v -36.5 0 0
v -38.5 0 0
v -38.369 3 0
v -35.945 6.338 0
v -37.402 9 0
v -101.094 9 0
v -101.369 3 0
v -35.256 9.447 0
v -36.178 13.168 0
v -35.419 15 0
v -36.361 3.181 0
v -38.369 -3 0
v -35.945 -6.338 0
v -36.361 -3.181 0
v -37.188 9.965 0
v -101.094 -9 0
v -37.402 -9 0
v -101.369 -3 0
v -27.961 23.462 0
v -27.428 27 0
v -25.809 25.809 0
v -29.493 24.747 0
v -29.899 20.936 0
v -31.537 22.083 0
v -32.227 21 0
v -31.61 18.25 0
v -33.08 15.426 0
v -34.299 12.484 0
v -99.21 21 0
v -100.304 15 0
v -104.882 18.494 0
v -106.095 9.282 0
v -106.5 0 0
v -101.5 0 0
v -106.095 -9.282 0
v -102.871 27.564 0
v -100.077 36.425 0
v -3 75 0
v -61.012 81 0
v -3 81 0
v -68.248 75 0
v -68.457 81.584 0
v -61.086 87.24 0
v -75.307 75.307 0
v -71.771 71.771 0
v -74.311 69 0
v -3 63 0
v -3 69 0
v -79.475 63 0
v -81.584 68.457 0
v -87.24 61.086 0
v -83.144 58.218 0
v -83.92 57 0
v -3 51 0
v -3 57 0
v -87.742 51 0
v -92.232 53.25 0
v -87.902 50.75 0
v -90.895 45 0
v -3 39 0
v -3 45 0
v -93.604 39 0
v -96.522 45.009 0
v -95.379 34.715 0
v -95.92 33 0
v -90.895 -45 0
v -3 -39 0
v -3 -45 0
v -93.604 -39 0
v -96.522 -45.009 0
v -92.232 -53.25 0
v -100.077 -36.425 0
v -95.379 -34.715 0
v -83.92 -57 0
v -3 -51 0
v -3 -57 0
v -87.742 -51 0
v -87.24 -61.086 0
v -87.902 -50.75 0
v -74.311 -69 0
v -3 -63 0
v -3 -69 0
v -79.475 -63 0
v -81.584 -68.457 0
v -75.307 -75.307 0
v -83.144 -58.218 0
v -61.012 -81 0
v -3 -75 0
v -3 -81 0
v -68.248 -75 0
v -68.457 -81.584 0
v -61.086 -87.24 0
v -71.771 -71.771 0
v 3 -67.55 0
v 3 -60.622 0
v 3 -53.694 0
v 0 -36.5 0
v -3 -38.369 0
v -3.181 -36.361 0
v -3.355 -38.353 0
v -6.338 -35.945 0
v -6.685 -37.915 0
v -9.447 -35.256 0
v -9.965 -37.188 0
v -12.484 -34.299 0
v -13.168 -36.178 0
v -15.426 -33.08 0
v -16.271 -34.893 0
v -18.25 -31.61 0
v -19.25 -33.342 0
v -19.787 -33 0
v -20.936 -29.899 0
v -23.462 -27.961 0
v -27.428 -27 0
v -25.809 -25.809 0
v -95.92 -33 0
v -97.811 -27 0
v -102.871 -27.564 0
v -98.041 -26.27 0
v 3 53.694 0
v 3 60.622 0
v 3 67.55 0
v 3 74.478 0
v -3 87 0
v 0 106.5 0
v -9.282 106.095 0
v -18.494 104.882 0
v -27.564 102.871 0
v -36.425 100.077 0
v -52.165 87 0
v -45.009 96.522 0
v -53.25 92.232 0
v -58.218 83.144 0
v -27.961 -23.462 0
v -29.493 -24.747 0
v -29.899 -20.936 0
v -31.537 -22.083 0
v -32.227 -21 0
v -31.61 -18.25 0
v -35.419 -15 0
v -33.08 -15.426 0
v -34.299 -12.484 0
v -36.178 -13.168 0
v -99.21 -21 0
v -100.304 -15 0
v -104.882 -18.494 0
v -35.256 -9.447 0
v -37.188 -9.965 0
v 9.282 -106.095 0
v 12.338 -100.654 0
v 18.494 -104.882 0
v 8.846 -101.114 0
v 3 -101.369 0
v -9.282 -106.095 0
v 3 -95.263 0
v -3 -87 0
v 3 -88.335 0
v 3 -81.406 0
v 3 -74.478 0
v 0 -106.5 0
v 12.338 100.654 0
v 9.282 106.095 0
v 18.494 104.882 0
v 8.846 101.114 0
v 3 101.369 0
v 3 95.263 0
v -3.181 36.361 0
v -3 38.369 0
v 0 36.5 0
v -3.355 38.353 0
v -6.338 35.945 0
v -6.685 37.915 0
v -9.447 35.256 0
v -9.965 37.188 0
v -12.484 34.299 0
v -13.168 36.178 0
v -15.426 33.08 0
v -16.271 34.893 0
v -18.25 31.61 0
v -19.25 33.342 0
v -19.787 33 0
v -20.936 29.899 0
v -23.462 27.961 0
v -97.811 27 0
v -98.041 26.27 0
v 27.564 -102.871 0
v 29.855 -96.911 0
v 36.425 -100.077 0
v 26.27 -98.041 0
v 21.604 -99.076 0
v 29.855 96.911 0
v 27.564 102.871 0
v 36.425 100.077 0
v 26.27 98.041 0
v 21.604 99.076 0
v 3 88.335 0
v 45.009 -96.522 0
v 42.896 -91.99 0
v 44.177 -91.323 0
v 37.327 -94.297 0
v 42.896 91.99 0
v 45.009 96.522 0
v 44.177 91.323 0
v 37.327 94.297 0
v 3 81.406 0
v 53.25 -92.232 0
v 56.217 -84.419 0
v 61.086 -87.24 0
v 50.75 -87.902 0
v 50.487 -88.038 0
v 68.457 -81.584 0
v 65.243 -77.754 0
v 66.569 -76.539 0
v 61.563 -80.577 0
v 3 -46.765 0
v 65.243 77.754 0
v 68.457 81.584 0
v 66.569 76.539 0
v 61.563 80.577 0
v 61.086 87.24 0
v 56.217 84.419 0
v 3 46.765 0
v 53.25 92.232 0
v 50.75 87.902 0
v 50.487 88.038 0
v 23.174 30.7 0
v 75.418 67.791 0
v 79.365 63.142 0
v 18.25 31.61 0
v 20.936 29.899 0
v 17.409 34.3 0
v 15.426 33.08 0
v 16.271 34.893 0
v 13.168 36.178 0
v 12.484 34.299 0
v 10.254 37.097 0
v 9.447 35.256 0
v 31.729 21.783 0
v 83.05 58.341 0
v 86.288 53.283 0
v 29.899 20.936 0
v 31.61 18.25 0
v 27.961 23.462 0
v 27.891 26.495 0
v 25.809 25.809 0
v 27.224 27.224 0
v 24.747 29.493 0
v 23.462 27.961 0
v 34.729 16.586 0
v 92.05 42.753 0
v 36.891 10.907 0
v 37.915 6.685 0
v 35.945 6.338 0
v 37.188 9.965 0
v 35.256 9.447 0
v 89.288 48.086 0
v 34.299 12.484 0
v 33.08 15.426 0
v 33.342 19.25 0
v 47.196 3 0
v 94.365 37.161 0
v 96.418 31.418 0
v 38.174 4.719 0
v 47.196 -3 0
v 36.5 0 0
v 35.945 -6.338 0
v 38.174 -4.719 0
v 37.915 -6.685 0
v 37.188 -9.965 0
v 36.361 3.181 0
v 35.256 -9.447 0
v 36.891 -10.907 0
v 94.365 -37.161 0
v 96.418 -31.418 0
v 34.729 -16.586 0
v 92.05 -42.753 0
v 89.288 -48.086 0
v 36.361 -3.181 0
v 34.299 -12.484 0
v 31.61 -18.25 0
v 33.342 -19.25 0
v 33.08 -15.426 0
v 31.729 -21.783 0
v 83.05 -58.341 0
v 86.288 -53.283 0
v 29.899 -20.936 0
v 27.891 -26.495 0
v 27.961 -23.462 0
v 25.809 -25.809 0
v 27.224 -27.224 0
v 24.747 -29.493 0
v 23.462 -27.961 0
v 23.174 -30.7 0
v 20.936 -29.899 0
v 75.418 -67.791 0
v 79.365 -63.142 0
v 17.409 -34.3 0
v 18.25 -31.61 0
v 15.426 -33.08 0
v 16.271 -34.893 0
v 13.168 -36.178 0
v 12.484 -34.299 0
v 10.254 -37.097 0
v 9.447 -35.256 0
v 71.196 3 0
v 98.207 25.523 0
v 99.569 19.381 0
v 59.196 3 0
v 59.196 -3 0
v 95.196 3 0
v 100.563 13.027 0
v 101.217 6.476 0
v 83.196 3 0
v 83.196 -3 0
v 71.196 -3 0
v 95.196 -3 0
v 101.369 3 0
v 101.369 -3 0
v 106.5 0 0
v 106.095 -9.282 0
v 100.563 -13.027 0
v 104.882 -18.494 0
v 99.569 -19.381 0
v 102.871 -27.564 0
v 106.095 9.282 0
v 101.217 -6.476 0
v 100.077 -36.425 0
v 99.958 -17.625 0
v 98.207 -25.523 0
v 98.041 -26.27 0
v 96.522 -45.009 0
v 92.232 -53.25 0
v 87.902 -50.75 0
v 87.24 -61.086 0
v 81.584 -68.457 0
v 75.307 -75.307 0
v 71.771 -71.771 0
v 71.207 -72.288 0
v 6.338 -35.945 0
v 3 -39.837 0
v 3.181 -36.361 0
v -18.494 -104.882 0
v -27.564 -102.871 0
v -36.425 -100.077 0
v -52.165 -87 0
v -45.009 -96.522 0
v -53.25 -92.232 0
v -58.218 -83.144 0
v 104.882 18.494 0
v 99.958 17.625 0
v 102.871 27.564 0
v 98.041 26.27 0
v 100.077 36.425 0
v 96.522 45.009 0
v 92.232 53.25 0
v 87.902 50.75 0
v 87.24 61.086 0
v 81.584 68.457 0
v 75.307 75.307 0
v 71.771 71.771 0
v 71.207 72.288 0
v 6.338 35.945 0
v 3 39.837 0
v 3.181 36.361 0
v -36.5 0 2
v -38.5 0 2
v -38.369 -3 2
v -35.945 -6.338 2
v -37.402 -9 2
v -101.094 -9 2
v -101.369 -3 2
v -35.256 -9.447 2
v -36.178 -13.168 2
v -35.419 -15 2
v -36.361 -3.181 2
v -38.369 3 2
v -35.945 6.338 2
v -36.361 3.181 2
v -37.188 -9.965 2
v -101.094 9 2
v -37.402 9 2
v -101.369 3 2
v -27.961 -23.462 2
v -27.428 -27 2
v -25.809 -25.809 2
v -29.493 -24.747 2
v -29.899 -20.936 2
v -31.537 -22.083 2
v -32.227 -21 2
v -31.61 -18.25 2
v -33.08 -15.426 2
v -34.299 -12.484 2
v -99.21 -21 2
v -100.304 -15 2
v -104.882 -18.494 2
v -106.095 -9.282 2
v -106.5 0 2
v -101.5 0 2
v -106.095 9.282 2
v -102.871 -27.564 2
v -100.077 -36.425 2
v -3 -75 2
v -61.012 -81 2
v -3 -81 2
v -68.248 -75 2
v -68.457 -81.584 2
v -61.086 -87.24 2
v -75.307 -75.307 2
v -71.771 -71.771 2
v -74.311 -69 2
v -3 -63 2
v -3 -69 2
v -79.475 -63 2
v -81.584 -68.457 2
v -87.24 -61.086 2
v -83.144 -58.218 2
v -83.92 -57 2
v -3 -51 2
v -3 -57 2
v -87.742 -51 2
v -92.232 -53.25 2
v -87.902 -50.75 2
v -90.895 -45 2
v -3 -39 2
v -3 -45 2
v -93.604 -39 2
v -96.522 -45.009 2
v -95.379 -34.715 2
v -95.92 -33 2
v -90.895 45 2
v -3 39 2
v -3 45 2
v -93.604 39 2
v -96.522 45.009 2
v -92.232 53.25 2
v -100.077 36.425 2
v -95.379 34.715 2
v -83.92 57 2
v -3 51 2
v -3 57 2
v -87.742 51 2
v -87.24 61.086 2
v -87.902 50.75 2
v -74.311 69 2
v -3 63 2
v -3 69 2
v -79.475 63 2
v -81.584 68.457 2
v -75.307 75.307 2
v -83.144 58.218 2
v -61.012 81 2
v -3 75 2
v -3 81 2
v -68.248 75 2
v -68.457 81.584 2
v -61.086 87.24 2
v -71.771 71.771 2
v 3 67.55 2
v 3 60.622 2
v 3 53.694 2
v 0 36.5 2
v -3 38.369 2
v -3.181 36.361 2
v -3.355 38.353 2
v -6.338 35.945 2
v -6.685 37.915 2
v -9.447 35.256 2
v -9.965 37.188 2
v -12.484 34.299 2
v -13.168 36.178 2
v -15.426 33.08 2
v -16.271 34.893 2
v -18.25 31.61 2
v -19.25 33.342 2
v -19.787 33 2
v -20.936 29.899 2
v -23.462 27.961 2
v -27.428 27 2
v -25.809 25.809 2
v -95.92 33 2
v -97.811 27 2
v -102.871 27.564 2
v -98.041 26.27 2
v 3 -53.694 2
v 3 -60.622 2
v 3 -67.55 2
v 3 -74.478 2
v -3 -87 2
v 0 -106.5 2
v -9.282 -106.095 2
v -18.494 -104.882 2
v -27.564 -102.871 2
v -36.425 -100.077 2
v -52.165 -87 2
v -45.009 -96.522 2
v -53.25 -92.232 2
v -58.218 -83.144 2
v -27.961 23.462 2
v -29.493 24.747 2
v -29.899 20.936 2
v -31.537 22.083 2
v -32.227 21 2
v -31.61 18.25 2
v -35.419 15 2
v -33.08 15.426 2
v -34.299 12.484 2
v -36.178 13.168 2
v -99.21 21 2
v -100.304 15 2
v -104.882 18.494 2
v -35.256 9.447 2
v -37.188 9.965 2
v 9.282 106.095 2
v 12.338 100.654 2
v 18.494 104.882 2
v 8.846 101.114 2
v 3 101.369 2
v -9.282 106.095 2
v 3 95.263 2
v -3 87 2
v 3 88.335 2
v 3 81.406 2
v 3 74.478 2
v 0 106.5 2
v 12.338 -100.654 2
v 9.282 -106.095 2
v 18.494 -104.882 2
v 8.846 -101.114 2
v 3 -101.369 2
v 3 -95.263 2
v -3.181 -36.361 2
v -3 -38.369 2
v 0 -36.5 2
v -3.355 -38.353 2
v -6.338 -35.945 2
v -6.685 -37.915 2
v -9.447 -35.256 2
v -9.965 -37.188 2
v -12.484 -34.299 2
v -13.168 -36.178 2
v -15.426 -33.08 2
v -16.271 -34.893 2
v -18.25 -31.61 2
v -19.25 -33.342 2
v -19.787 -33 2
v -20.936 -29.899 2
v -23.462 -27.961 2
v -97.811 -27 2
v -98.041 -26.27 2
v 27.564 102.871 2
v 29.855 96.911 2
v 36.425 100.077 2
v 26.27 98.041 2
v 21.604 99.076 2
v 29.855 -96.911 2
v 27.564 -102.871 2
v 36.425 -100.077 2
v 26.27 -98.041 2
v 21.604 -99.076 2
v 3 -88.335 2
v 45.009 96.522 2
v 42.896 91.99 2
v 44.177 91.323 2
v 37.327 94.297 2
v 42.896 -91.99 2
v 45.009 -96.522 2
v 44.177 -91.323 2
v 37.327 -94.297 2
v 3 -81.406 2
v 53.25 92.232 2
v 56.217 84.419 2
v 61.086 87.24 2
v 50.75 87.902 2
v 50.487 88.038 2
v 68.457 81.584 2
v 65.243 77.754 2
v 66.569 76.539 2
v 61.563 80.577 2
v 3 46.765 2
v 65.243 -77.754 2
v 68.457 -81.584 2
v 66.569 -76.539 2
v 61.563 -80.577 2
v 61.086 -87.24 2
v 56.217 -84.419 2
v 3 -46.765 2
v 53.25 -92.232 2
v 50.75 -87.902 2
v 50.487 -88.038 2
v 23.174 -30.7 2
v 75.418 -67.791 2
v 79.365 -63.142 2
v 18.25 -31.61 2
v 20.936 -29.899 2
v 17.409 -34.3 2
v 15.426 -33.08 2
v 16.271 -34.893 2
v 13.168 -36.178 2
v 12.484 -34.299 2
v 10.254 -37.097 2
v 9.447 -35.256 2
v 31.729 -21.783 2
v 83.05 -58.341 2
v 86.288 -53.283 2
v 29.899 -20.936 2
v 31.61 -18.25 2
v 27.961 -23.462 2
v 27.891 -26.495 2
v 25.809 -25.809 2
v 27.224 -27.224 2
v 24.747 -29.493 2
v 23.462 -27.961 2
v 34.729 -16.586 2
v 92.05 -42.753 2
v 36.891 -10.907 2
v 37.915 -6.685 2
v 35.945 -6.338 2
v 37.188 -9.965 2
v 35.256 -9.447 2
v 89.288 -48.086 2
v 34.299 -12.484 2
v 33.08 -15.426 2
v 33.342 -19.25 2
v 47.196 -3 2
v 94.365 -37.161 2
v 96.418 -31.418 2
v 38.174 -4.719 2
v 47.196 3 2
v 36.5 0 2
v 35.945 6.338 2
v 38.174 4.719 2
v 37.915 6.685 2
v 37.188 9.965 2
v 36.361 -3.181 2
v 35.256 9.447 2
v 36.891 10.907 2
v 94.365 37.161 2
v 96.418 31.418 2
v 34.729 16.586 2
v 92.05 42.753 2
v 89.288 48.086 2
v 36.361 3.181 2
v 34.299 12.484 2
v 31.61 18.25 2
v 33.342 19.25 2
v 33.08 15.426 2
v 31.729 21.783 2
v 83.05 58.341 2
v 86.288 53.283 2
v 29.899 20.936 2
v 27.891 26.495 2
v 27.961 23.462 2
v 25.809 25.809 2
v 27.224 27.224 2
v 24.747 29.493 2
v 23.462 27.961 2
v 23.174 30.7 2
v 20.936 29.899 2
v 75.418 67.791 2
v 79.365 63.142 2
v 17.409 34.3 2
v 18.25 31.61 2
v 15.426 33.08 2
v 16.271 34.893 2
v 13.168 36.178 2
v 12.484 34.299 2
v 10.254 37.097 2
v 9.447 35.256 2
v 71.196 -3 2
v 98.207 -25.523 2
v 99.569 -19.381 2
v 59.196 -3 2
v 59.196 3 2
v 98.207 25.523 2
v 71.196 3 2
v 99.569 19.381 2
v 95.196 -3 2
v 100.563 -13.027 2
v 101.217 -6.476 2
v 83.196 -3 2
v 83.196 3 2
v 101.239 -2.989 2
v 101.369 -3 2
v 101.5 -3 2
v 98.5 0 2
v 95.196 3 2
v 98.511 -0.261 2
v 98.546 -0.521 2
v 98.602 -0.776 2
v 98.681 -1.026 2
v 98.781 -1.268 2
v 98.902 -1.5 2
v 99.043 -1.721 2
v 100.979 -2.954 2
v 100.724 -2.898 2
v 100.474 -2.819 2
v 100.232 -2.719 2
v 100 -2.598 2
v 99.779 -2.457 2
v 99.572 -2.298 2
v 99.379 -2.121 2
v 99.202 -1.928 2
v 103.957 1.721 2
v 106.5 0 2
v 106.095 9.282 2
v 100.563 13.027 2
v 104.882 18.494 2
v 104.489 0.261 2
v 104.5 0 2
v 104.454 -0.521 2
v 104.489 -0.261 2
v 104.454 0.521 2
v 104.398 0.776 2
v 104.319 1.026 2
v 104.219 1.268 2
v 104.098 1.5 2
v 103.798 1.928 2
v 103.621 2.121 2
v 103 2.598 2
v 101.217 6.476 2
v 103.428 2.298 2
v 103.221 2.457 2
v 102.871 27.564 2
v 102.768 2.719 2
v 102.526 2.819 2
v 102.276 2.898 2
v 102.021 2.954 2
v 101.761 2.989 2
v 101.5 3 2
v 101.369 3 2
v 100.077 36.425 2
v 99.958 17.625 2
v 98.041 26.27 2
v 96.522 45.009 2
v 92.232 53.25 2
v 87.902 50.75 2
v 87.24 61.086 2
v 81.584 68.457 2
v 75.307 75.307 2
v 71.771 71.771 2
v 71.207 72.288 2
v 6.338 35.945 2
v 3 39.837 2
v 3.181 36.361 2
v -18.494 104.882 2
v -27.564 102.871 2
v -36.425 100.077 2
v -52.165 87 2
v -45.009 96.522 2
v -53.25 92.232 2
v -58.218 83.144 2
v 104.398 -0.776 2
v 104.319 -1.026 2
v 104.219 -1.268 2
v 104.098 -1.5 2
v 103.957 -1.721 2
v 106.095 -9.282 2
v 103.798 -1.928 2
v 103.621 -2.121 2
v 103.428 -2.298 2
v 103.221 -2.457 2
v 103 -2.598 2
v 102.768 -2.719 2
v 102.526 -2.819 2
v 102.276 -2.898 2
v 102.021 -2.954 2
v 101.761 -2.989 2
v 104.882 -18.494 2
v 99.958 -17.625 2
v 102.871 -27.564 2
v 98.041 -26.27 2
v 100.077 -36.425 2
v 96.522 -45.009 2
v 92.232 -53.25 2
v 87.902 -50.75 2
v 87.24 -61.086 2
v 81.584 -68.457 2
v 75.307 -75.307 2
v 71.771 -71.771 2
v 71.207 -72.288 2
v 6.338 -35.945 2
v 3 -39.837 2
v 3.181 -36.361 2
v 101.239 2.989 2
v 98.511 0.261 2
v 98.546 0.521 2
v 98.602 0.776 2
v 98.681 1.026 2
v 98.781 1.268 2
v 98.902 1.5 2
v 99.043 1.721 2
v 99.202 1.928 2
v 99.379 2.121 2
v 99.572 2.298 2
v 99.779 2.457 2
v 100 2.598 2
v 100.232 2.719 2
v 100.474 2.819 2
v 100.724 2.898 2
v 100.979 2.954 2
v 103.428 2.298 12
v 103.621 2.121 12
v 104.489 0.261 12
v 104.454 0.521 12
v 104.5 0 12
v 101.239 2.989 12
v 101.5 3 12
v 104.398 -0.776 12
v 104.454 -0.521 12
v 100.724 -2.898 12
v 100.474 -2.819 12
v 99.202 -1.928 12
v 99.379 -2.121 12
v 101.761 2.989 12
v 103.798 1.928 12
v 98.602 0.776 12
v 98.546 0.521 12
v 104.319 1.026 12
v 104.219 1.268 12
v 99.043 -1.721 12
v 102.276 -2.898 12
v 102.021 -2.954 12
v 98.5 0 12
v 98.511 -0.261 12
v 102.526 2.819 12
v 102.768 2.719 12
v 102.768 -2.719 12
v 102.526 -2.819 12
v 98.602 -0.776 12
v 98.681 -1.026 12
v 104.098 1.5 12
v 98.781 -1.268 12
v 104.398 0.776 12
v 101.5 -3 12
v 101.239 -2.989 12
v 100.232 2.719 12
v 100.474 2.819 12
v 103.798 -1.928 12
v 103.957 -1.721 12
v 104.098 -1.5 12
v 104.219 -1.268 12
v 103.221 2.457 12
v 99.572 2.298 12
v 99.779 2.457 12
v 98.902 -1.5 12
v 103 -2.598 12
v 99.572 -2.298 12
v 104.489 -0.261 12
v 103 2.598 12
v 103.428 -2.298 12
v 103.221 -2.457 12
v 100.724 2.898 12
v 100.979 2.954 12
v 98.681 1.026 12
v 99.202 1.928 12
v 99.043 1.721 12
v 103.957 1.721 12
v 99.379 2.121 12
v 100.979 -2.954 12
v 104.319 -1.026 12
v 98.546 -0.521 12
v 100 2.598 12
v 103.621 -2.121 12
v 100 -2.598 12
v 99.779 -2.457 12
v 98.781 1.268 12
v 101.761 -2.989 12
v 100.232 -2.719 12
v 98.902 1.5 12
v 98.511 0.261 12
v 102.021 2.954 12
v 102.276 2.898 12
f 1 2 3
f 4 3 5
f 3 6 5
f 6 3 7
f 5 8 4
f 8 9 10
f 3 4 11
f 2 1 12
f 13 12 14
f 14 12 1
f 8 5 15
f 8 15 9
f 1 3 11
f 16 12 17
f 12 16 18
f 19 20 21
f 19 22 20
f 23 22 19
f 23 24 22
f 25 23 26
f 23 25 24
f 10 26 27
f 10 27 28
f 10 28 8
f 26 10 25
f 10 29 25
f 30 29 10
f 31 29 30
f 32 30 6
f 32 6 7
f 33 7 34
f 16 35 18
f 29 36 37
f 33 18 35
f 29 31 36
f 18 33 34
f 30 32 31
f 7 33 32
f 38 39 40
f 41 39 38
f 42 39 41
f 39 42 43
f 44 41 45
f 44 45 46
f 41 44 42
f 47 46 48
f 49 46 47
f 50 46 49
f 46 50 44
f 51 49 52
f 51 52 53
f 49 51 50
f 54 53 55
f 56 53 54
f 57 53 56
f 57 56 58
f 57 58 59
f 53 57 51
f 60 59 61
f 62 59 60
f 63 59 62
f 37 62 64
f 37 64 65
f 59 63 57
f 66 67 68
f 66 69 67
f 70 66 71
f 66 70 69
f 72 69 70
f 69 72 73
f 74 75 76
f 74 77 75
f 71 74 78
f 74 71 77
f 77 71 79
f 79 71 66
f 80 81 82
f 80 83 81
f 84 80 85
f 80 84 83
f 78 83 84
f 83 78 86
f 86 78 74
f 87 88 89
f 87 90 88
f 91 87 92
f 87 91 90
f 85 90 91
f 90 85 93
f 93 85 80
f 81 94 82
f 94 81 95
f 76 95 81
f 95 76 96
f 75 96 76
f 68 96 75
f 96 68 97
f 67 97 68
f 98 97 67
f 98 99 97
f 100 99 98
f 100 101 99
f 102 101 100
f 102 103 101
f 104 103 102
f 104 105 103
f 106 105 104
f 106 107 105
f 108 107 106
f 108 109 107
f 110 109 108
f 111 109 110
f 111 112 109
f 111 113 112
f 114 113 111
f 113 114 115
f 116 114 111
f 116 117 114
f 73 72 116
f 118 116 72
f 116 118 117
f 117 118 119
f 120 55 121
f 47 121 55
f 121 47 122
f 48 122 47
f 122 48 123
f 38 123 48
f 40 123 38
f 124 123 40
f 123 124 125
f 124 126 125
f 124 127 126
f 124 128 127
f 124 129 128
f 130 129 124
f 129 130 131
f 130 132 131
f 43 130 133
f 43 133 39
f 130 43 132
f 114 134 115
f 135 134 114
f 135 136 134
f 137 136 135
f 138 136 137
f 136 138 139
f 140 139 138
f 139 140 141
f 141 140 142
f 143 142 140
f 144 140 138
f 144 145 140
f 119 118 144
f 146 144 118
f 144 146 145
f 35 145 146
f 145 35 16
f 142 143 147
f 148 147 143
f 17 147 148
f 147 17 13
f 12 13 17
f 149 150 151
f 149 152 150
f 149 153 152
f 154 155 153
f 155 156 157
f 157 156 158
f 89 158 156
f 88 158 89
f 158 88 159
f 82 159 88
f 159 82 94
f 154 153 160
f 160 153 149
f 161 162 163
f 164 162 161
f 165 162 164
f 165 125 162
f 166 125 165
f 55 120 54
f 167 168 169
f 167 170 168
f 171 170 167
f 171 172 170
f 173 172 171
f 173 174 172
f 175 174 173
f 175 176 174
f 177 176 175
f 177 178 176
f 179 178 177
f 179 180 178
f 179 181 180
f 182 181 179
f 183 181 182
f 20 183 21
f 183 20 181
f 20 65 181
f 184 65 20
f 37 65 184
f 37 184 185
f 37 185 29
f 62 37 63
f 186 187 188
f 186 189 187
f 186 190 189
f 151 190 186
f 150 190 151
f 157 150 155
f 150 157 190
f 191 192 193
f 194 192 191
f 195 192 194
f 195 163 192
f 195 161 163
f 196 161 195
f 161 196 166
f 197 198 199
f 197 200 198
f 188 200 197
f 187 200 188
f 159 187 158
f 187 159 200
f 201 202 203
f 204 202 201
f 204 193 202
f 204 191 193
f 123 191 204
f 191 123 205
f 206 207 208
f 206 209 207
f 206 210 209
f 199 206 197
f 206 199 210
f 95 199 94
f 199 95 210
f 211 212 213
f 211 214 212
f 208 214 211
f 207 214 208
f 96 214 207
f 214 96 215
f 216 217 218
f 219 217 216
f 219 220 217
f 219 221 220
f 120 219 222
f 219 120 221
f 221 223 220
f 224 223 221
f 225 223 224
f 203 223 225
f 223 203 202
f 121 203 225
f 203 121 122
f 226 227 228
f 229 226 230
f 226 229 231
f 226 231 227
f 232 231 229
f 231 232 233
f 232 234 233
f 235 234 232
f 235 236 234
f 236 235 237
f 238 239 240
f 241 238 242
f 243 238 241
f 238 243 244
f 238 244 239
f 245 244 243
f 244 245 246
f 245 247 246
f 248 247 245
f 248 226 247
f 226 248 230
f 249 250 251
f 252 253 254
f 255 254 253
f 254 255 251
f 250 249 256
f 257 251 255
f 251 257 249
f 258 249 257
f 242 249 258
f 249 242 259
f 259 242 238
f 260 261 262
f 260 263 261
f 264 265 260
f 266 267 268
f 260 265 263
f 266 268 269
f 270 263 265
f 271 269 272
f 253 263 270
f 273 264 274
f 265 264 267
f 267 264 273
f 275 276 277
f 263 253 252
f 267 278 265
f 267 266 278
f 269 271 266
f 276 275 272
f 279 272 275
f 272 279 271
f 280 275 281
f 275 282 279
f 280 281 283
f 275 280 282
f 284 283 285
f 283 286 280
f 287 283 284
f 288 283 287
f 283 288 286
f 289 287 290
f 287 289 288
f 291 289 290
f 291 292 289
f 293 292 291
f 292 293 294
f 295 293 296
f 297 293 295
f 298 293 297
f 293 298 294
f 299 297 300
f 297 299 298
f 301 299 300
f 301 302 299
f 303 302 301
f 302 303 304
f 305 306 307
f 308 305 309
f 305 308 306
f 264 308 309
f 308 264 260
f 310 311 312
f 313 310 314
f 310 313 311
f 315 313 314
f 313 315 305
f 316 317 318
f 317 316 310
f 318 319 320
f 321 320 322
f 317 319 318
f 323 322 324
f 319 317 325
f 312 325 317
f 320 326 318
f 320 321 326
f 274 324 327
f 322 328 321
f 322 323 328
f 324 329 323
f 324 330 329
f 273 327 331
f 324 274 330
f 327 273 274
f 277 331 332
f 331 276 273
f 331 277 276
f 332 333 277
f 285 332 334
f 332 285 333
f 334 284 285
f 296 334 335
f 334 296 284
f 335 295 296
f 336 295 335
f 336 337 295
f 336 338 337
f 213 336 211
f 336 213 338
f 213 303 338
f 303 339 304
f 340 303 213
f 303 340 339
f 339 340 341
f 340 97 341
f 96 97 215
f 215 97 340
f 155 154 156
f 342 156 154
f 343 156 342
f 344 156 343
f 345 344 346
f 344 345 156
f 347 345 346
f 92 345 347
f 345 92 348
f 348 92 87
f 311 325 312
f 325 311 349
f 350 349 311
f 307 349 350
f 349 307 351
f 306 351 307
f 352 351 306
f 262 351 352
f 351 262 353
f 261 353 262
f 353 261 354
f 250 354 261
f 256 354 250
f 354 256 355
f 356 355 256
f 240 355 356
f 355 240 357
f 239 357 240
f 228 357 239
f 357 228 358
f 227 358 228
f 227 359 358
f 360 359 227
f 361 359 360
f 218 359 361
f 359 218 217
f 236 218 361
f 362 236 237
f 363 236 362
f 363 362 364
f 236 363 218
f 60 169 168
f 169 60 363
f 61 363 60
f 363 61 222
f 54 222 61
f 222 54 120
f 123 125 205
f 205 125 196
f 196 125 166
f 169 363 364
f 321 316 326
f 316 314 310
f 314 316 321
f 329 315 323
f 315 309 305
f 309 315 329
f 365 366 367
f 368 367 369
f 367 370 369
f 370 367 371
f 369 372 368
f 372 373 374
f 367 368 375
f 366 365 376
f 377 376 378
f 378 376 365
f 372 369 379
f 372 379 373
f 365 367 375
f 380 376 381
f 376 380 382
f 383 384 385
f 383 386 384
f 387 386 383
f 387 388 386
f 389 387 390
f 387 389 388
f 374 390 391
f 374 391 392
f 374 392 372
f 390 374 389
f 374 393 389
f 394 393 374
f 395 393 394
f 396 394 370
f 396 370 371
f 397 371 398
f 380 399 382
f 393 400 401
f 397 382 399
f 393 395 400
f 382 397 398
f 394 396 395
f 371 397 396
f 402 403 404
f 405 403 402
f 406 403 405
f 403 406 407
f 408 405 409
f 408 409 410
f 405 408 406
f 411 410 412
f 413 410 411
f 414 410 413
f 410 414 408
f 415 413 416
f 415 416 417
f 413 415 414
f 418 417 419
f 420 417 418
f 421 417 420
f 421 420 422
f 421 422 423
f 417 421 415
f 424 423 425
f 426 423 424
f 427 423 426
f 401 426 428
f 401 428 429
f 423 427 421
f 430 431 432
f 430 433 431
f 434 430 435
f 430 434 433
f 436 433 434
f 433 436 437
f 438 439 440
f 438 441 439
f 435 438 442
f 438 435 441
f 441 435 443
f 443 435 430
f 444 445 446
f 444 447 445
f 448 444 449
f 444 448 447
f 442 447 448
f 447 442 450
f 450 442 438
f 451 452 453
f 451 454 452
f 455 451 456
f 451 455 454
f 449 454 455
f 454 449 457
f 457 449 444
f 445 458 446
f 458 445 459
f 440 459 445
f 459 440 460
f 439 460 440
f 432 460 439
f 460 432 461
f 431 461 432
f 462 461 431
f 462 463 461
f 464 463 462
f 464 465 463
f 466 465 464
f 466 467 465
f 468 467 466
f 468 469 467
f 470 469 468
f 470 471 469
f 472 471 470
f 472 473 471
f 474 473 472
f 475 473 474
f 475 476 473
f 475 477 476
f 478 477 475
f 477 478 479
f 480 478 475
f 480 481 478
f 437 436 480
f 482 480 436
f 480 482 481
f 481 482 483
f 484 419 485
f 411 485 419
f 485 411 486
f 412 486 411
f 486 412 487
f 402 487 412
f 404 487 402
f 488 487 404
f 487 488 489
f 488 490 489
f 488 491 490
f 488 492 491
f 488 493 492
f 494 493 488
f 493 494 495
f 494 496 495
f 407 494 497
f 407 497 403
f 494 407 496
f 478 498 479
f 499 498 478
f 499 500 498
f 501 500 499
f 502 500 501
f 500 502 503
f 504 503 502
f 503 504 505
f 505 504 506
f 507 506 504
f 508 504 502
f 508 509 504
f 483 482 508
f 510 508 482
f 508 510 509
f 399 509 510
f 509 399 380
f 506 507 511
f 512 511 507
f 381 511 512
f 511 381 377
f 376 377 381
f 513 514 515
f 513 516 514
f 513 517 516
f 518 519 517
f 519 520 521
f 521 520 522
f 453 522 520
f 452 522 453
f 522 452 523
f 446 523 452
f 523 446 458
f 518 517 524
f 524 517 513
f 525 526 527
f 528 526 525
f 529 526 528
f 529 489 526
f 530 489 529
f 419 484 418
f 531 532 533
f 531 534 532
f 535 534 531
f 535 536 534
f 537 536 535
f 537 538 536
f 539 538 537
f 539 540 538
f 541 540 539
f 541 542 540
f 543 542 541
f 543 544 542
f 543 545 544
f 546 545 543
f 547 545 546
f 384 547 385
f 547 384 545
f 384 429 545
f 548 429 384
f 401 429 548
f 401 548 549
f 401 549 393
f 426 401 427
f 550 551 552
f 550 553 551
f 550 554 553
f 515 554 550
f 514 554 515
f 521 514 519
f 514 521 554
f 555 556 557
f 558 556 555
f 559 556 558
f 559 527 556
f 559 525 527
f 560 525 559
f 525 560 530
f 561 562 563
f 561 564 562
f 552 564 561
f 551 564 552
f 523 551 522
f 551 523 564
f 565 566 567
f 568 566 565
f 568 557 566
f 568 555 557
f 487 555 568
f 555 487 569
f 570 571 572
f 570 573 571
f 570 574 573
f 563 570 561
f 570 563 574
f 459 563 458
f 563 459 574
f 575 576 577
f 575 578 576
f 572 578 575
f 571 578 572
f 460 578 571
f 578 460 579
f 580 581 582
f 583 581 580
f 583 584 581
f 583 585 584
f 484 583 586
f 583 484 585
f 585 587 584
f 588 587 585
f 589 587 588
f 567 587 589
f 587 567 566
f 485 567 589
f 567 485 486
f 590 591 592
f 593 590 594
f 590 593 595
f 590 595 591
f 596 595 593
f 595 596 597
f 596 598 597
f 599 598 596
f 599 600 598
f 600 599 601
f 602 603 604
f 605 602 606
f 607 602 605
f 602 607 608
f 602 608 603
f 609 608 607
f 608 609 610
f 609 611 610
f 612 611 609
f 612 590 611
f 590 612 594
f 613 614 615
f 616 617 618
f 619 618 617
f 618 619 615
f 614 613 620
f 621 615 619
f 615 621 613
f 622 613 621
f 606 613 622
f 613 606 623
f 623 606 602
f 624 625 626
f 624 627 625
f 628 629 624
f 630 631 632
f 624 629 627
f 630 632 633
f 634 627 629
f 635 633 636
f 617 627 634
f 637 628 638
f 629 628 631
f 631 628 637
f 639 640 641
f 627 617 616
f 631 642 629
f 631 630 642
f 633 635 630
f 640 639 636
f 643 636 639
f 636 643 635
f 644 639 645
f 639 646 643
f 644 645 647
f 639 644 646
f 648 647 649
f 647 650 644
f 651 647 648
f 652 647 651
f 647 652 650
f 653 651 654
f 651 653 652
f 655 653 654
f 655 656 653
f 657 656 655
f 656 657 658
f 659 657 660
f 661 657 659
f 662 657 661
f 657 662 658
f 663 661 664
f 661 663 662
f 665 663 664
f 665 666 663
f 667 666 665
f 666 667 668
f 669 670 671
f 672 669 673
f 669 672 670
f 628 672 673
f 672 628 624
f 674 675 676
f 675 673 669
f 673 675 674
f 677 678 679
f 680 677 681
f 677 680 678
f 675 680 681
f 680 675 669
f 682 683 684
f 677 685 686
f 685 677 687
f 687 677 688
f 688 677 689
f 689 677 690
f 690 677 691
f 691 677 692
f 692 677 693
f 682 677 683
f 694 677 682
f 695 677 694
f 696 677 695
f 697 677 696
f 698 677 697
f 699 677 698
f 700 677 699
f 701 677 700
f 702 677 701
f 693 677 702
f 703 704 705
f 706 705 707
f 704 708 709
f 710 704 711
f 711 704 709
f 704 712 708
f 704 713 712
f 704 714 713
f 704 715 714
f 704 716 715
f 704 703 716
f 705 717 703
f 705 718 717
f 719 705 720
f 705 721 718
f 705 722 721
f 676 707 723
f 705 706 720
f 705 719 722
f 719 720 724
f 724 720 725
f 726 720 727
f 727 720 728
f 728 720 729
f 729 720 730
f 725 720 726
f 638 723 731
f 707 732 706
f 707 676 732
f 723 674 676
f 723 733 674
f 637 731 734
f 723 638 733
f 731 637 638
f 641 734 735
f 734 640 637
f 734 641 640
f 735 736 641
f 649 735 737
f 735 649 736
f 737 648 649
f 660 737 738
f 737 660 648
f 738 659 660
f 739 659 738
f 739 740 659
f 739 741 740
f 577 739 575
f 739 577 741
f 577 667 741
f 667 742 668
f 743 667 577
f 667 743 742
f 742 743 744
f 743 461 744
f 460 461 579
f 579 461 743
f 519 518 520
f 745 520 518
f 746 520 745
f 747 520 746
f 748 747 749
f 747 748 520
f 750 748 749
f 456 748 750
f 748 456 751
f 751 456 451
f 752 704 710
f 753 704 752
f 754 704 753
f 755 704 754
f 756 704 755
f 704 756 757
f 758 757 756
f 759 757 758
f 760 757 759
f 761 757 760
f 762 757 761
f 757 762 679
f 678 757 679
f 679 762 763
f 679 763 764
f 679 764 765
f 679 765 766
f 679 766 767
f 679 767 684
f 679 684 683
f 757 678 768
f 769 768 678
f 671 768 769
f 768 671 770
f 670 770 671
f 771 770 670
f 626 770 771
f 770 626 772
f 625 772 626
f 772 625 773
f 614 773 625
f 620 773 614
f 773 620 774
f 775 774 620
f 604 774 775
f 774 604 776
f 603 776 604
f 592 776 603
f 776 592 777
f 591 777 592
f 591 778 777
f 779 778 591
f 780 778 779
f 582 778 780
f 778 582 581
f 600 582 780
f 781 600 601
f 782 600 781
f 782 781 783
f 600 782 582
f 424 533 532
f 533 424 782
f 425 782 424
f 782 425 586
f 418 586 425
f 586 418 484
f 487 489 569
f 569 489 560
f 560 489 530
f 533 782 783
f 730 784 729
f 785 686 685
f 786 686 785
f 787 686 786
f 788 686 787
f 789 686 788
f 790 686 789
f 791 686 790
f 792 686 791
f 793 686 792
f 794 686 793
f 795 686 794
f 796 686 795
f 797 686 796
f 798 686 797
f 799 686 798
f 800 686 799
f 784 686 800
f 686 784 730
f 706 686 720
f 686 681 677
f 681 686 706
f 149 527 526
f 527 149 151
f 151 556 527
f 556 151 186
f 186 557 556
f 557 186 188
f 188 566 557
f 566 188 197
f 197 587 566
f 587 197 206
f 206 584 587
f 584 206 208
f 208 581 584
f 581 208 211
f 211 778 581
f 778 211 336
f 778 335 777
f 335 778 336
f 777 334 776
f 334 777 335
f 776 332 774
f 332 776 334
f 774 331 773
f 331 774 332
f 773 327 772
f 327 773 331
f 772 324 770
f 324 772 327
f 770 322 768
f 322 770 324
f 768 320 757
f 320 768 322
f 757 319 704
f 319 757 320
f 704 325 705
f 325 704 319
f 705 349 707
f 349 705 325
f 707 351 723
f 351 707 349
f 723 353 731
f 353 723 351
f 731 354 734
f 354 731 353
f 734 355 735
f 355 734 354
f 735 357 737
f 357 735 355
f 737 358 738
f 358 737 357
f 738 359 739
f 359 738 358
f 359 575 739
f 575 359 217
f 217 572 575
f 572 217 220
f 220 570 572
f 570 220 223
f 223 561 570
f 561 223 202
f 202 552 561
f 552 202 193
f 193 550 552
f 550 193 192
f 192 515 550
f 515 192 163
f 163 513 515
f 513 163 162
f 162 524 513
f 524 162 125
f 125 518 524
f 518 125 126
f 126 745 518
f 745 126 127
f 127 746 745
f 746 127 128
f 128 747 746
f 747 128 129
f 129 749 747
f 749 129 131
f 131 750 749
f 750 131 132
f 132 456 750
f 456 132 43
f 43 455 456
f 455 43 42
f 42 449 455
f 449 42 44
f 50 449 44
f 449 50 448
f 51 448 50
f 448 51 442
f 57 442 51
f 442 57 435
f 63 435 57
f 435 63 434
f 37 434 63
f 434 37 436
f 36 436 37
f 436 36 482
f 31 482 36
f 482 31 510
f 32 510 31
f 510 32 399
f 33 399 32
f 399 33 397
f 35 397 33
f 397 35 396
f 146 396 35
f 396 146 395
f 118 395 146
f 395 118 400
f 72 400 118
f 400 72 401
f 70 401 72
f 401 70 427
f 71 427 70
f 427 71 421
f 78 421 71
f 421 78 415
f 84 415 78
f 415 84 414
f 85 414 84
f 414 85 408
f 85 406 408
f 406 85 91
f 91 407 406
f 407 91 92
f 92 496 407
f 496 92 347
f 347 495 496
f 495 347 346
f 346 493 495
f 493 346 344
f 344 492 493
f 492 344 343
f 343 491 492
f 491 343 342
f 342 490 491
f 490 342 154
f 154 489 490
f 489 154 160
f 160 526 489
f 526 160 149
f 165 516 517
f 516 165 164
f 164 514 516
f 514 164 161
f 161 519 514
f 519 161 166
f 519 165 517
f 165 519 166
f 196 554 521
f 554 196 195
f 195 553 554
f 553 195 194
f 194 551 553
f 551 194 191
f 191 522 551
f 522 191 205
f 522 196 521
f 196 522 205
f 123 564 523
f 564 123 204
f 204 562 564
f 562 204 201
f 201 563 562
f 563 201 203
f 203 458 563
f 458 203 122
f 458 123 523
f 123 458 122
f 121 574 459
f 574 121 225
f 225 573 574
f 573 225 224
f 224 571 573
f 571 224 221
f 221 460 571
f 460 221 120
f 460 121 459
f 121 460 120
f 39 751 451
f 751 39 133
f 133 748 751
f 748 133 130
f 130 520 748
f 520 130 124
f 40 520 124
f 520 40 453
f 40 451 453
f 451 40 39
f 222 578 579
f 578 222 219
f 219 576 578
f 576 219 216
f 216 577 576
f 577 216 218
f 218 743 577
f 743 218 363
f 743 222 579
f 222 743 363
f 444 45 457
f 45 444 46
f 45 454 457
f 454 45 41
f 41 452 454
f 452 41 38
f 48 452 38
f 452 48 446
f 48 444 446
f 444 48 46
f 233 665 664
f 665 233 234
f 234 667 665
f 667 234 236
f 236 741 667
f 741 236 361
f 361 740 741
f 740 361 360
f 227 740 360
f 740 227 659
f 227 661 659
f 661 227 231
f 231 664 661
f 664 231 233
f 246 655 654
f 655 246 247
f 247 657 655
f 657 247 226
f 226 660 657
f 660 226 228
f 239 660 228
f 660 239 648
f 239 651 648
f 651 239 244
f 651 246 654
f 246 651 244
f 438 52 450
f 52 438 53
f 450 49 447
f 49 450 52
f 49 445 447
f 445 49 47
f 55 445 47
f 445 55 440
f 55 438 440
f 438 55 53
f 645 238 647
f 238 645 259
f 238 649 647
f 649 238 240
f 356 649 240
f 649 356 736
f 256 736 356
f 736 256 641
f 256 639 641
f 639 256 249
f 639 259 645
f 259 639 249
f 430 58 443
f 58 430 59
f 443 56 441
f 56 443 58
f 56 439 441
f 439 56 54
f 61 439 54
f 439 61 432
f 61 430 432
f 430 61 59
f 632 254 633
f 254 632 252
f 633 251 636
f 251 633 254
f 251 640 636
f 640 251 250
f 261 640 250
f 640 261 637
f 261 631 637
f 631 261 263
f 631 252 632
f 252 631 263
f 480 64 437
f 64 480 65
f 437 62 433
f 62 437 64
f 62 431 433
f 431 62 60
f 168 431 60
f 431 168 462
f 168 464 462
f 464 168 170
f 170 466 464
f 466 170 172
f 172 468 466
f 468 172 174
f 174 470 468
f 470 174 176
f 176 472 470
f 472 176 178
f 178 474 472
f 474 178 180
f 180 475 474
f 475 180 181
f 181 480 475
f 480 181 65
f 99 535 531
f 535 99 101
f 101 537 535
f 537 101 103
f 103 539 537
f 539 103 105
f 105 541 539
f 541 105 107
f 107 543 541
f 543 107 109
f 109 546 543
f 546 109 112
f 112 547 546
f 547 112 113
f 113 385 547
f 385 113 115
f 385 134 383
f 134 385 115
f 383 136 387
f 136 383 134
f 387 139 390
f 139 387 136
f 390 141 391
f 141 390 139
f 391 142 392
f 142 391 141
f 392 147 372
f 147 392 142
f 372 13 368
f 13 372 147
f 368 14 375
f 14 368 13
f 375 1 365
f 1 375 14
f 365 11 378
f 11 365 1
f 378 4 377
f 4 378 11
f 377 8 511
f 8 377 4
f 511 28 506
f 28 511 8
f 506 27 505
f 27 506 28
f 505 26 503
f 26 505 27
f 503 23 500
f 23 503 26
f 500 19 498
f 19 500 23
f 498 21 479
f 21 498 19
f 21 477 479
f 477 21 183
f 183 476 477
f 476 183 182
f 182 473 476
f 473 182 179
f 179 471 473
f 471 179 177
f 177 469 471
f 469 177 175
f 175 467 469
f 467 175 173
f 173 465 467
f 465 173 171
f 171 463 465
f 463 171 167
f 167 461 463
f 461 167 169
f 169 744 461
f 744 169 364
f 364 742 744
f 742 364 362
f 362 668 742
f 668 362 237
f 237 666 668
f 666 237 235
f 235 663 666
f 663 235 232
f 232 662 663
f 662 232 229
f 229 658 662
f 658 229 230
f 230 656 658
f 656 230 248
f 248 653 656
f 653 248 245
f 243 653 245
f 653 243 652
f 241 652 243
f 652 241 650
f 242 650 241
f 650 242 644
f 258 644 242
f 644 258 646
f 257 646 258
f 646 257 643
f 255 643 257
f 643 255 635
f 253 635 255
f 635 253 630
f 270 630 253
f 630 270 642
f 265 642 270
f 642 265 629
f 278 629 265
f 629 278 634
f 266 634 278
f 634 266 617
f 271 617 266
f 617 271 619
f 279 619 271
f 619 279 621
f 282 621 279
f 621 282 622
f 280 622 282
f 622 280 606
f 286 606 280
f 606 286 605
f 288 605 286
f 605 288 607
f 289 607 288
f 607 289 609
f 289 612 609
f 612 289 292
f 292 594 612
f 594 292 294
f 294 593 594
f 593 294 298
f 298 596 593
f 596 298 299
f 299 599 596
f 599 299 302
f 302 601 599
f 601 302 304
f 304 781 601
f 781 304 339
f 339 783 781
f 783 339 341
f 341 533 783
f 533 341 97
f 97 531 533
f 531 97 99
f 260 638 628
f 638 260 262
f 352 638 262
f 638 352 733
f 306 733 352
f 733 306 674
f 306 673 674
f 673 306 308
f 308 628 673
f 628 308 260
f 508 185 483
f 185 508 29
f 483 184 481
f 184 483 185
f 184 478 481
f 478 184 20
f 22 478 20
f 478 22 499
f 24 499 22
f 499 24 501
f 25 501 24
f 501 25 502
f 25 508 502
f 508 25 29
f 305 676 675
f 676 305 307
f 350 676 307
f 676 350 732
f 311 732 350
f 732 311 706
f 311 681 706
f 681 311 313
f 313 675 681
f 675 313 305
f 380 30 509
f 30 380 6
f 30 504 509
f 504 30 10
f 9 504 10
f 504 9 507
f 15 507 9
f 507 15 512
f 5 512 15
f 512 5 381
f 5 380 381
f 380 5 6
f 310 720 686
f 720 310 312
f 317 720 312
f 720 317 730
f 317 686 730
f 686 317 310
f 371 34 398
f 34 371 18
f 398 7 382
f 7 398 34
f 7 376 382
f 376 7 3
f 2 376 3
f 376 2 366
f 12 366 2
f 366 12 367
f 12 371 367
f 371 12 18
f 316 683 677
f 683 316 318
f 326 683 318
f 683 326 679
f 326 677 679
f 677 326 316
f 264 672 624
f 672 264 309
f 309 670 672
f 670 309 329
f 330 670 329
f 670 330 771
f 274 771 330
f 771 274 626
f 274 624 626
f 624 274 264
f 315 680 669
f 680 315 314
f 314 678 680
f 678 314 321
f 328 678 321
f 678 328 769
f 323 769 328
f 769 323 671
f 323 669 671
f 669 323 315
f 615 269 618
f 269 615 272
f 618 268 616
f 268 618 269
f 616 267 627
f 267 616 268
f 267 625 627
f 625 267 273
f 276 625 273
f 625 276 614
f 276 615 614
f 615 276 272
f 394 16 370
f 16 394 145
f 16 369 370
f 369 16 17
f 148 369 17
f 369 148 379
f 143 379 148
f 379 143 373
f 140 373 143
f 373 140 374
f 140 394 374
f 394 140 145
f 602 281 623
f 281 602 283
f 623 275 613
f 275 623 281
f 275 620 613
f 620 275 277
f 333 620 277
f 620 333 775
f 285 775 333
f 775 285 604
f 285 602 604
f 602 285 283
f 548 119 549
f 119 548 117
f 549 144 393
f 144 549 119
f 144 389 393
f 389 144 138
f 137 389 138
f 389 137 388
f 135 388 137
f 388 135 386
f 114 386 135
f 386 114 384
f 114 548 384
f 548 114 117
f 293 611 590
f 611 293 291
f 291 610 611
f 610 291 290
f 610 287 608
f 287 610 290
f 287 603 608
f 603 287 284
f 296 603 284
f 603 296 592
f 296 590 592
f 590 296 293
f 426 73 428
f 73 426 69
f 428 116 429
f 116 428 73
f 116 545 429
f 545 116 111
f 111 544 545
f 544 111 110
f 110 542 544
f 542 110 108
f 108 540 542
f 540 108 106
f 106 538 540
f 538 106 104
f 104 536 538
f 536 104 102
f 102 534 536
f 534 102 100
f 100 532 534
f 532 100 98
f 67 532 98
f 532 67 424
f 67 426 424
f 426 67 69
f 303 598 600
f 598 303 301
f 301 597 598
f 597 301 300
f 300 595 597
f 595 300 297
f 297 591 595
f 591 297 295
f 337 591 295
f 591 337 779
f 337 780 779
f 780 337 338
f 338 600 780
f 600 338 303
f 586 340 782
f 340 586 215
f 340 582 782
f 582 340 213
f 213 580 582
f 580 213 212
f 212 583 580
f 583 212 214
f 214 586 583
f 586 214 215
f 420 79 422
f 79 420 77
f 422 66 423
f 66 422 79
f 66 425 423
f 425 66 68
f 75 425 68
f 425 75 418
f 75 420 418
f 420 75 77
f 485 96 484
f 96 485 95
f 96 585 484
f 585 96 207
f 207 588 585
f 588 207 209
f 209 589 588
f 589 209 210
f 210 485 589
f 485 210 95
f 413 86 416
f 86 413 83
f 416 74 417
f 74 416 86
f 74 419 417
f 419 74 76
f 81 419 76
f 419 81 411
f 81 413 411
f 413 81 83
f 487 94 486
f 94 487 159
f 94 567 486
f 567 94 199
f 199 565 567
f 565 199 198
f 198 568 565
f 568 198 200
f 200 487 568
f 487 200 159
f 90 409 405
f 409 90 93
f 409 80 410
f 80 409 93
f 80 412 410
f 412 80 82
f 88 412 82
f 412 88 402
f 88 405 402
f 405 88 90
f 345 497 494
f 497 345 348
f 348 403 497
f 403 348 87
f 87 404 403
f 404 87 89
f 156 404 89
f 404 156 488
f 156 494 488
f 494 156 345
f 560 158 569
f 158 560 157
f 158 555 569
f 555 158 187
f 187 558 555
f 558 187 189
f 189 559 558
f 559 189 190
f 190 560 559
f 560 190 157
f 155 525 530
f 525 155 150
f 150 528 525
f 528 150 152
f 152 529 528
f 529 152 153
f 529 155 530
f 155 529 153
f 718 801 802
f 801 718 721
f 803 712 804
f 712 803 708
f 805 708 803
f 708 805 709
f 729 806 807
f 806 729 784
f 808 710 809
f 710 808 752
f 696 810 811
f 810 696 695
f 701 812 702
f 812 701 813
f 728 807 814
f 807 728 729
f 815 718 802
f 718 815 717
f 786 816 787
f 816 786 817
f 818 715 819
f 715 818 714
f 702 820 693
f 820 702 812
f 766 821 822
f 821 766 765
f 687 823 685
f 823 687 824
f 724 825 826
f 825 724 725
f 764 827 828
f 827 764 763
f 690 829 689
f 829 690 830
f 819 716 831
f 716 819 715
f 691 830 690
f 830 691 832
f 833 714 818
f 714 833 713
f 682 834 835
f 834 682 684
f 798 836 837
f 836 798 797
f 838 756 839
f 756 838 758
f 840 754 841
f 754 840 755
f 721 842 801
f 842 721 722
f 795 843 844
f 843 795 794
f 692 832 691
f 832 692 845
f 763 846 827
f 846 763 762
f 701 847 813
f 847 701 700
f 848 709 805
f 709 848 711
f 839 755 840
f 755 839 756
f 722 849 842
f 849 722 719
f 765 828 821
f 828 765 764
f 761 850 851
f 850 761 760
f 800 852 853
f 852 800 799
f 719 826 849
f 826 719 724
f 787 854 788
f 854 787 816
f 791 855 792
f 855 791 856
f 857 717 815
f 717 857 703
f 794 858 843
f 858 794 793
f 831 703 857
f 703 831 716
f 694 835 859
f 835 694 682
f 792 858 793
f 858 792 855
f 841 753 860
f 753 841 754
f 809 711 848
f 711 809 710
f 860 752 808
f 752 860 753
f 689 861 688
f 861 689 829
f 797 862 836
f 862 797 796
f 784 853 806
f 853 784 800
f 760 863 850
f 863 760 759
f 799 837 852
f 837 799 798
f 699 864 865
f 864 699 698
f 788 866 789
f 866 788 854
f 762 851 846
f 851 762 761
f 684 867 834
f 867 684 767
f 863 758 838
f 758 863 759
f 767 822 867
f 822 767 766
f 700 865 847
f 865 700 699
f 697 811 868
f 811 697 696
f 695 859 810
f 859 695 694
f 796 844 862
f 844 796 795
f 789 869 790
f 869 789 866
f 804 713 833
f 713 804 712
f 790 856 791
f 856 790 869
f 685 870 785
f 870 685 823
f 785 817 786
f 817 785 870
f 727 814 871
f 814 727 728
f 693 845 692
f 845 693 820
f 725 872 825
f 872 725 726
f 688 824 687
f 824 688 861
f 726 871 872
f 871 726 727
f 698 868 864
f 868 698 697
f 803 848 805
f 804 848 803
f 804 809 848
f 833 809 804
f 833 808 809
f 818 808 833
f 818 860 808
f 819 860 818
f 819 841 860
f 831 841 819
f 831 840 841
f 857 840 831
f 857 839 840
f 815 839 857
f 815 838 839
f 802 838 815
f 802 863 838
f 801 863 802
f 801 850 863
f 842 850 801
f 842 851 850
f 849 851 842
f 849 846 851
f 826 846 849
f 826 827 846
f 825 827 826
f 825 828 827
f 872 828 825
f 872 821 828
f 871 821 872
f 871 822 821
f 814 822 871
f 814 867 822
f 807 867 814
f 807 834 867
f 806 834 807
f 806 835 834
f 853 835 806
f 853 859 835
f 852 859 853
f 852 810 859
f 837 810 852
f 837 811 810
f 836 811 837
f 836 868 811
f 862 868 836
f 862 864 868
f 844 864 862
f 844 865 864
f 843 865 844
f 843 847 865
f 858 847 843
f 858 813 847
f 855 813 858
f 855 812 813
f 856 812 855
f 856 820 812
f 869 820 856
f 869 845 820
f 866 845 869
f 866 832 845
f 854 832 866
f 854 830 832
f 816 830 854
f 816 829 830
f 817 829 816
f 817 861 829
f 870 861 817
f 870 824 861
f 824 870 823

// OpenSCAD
/*                                                 -*- c++ -*-
 * A Bahtinov mask generator.
 * Units in mm, default values are for
 * a Celestron NexStar GPS 8.
 *
 * Copyright 2013-2014, Brent Burton
 * License: CC-BY-SA
 *
 * Updated: 2014-06-23
 */

// This is the diameter of the mask.
outerDiameter = 215; // [60:400]

// The telescope light's path diameter.
aperture = 203; // [60:400]

// Diameter of secondary mirror holder. If no secondary, set to 0.
centerHoleDiameter = 71; // [0:90]

// Width of the gaps and the bars.
gap = 6; // [4:10]

/* create a series of bars covering roughly one half of the
 * scope aperture. Located in the +X side.
 */
module bars(gap, width, num=5) {
    num = round(num);
    for (i=[-num:num]) {
        translate([width/2,i*2*gap]) square([width,gap], center=true);
    }
}

module bahtinovBars(gap,width) {
    numBars = aperture/2 / gap / 2 -1;
    // +X +Y bars
    intersection() {
        rotate([0,0,30]) bars(gap, width, numBars);
        square([outerDiameter/2, outerDiameter/2], center=false);
    }
    // +X -Y bars
    intersection() {
        rotate([0,0,-30]) bars(gap, width, numBars);
        translate([0,-outerDiameter/2]) square([outerDiameter/2, outerDiameter/2], center=false);
    }
    // -X bars
    rotate([0,0,180]) bars(gap, width, numBars);
}

$fn=72;
module bahtinov2D() {
    width = aperture/2;
    difference() {                          // overall plate minus center hole
        union() {
            difference() {                  // trims the mask to aperture size
                circle(r=aperture/2+1);
                bahtinovBars(gap,width);
            }
            difference() {                  // makes the outer margin
                circle(r=outerDiameter/2-1);
                circle(r=aperture/2);
            }
            // Add horizontal and vertical structural bars:
            square([gap,2*(aperture/2+1)], center=true);
            translate([aperture/4,0]) square([aperture/2+1,gap], center=true);
            // Add center hole margin if needed:
            if (centerHoleDiameter > 0 && centerHoleDiameter < outerDiameter) {
                circle(r=(centerHoleDiameter+gap)/2);
            }
        }
        // subtract center hole if needed
        if (centerHoleDiameter > 0 && centerHoleDiameter < outerDiameter) {
            circle(r=centerHoleDiameter/2+1);
        }
    }
}

union() {
    linear_extrude(height=2) bahtinov2D();
    // add a little handle
    translate([outerDiameter/2-gap,0,0]) cylinder(r=gap/2, h=12);
}
